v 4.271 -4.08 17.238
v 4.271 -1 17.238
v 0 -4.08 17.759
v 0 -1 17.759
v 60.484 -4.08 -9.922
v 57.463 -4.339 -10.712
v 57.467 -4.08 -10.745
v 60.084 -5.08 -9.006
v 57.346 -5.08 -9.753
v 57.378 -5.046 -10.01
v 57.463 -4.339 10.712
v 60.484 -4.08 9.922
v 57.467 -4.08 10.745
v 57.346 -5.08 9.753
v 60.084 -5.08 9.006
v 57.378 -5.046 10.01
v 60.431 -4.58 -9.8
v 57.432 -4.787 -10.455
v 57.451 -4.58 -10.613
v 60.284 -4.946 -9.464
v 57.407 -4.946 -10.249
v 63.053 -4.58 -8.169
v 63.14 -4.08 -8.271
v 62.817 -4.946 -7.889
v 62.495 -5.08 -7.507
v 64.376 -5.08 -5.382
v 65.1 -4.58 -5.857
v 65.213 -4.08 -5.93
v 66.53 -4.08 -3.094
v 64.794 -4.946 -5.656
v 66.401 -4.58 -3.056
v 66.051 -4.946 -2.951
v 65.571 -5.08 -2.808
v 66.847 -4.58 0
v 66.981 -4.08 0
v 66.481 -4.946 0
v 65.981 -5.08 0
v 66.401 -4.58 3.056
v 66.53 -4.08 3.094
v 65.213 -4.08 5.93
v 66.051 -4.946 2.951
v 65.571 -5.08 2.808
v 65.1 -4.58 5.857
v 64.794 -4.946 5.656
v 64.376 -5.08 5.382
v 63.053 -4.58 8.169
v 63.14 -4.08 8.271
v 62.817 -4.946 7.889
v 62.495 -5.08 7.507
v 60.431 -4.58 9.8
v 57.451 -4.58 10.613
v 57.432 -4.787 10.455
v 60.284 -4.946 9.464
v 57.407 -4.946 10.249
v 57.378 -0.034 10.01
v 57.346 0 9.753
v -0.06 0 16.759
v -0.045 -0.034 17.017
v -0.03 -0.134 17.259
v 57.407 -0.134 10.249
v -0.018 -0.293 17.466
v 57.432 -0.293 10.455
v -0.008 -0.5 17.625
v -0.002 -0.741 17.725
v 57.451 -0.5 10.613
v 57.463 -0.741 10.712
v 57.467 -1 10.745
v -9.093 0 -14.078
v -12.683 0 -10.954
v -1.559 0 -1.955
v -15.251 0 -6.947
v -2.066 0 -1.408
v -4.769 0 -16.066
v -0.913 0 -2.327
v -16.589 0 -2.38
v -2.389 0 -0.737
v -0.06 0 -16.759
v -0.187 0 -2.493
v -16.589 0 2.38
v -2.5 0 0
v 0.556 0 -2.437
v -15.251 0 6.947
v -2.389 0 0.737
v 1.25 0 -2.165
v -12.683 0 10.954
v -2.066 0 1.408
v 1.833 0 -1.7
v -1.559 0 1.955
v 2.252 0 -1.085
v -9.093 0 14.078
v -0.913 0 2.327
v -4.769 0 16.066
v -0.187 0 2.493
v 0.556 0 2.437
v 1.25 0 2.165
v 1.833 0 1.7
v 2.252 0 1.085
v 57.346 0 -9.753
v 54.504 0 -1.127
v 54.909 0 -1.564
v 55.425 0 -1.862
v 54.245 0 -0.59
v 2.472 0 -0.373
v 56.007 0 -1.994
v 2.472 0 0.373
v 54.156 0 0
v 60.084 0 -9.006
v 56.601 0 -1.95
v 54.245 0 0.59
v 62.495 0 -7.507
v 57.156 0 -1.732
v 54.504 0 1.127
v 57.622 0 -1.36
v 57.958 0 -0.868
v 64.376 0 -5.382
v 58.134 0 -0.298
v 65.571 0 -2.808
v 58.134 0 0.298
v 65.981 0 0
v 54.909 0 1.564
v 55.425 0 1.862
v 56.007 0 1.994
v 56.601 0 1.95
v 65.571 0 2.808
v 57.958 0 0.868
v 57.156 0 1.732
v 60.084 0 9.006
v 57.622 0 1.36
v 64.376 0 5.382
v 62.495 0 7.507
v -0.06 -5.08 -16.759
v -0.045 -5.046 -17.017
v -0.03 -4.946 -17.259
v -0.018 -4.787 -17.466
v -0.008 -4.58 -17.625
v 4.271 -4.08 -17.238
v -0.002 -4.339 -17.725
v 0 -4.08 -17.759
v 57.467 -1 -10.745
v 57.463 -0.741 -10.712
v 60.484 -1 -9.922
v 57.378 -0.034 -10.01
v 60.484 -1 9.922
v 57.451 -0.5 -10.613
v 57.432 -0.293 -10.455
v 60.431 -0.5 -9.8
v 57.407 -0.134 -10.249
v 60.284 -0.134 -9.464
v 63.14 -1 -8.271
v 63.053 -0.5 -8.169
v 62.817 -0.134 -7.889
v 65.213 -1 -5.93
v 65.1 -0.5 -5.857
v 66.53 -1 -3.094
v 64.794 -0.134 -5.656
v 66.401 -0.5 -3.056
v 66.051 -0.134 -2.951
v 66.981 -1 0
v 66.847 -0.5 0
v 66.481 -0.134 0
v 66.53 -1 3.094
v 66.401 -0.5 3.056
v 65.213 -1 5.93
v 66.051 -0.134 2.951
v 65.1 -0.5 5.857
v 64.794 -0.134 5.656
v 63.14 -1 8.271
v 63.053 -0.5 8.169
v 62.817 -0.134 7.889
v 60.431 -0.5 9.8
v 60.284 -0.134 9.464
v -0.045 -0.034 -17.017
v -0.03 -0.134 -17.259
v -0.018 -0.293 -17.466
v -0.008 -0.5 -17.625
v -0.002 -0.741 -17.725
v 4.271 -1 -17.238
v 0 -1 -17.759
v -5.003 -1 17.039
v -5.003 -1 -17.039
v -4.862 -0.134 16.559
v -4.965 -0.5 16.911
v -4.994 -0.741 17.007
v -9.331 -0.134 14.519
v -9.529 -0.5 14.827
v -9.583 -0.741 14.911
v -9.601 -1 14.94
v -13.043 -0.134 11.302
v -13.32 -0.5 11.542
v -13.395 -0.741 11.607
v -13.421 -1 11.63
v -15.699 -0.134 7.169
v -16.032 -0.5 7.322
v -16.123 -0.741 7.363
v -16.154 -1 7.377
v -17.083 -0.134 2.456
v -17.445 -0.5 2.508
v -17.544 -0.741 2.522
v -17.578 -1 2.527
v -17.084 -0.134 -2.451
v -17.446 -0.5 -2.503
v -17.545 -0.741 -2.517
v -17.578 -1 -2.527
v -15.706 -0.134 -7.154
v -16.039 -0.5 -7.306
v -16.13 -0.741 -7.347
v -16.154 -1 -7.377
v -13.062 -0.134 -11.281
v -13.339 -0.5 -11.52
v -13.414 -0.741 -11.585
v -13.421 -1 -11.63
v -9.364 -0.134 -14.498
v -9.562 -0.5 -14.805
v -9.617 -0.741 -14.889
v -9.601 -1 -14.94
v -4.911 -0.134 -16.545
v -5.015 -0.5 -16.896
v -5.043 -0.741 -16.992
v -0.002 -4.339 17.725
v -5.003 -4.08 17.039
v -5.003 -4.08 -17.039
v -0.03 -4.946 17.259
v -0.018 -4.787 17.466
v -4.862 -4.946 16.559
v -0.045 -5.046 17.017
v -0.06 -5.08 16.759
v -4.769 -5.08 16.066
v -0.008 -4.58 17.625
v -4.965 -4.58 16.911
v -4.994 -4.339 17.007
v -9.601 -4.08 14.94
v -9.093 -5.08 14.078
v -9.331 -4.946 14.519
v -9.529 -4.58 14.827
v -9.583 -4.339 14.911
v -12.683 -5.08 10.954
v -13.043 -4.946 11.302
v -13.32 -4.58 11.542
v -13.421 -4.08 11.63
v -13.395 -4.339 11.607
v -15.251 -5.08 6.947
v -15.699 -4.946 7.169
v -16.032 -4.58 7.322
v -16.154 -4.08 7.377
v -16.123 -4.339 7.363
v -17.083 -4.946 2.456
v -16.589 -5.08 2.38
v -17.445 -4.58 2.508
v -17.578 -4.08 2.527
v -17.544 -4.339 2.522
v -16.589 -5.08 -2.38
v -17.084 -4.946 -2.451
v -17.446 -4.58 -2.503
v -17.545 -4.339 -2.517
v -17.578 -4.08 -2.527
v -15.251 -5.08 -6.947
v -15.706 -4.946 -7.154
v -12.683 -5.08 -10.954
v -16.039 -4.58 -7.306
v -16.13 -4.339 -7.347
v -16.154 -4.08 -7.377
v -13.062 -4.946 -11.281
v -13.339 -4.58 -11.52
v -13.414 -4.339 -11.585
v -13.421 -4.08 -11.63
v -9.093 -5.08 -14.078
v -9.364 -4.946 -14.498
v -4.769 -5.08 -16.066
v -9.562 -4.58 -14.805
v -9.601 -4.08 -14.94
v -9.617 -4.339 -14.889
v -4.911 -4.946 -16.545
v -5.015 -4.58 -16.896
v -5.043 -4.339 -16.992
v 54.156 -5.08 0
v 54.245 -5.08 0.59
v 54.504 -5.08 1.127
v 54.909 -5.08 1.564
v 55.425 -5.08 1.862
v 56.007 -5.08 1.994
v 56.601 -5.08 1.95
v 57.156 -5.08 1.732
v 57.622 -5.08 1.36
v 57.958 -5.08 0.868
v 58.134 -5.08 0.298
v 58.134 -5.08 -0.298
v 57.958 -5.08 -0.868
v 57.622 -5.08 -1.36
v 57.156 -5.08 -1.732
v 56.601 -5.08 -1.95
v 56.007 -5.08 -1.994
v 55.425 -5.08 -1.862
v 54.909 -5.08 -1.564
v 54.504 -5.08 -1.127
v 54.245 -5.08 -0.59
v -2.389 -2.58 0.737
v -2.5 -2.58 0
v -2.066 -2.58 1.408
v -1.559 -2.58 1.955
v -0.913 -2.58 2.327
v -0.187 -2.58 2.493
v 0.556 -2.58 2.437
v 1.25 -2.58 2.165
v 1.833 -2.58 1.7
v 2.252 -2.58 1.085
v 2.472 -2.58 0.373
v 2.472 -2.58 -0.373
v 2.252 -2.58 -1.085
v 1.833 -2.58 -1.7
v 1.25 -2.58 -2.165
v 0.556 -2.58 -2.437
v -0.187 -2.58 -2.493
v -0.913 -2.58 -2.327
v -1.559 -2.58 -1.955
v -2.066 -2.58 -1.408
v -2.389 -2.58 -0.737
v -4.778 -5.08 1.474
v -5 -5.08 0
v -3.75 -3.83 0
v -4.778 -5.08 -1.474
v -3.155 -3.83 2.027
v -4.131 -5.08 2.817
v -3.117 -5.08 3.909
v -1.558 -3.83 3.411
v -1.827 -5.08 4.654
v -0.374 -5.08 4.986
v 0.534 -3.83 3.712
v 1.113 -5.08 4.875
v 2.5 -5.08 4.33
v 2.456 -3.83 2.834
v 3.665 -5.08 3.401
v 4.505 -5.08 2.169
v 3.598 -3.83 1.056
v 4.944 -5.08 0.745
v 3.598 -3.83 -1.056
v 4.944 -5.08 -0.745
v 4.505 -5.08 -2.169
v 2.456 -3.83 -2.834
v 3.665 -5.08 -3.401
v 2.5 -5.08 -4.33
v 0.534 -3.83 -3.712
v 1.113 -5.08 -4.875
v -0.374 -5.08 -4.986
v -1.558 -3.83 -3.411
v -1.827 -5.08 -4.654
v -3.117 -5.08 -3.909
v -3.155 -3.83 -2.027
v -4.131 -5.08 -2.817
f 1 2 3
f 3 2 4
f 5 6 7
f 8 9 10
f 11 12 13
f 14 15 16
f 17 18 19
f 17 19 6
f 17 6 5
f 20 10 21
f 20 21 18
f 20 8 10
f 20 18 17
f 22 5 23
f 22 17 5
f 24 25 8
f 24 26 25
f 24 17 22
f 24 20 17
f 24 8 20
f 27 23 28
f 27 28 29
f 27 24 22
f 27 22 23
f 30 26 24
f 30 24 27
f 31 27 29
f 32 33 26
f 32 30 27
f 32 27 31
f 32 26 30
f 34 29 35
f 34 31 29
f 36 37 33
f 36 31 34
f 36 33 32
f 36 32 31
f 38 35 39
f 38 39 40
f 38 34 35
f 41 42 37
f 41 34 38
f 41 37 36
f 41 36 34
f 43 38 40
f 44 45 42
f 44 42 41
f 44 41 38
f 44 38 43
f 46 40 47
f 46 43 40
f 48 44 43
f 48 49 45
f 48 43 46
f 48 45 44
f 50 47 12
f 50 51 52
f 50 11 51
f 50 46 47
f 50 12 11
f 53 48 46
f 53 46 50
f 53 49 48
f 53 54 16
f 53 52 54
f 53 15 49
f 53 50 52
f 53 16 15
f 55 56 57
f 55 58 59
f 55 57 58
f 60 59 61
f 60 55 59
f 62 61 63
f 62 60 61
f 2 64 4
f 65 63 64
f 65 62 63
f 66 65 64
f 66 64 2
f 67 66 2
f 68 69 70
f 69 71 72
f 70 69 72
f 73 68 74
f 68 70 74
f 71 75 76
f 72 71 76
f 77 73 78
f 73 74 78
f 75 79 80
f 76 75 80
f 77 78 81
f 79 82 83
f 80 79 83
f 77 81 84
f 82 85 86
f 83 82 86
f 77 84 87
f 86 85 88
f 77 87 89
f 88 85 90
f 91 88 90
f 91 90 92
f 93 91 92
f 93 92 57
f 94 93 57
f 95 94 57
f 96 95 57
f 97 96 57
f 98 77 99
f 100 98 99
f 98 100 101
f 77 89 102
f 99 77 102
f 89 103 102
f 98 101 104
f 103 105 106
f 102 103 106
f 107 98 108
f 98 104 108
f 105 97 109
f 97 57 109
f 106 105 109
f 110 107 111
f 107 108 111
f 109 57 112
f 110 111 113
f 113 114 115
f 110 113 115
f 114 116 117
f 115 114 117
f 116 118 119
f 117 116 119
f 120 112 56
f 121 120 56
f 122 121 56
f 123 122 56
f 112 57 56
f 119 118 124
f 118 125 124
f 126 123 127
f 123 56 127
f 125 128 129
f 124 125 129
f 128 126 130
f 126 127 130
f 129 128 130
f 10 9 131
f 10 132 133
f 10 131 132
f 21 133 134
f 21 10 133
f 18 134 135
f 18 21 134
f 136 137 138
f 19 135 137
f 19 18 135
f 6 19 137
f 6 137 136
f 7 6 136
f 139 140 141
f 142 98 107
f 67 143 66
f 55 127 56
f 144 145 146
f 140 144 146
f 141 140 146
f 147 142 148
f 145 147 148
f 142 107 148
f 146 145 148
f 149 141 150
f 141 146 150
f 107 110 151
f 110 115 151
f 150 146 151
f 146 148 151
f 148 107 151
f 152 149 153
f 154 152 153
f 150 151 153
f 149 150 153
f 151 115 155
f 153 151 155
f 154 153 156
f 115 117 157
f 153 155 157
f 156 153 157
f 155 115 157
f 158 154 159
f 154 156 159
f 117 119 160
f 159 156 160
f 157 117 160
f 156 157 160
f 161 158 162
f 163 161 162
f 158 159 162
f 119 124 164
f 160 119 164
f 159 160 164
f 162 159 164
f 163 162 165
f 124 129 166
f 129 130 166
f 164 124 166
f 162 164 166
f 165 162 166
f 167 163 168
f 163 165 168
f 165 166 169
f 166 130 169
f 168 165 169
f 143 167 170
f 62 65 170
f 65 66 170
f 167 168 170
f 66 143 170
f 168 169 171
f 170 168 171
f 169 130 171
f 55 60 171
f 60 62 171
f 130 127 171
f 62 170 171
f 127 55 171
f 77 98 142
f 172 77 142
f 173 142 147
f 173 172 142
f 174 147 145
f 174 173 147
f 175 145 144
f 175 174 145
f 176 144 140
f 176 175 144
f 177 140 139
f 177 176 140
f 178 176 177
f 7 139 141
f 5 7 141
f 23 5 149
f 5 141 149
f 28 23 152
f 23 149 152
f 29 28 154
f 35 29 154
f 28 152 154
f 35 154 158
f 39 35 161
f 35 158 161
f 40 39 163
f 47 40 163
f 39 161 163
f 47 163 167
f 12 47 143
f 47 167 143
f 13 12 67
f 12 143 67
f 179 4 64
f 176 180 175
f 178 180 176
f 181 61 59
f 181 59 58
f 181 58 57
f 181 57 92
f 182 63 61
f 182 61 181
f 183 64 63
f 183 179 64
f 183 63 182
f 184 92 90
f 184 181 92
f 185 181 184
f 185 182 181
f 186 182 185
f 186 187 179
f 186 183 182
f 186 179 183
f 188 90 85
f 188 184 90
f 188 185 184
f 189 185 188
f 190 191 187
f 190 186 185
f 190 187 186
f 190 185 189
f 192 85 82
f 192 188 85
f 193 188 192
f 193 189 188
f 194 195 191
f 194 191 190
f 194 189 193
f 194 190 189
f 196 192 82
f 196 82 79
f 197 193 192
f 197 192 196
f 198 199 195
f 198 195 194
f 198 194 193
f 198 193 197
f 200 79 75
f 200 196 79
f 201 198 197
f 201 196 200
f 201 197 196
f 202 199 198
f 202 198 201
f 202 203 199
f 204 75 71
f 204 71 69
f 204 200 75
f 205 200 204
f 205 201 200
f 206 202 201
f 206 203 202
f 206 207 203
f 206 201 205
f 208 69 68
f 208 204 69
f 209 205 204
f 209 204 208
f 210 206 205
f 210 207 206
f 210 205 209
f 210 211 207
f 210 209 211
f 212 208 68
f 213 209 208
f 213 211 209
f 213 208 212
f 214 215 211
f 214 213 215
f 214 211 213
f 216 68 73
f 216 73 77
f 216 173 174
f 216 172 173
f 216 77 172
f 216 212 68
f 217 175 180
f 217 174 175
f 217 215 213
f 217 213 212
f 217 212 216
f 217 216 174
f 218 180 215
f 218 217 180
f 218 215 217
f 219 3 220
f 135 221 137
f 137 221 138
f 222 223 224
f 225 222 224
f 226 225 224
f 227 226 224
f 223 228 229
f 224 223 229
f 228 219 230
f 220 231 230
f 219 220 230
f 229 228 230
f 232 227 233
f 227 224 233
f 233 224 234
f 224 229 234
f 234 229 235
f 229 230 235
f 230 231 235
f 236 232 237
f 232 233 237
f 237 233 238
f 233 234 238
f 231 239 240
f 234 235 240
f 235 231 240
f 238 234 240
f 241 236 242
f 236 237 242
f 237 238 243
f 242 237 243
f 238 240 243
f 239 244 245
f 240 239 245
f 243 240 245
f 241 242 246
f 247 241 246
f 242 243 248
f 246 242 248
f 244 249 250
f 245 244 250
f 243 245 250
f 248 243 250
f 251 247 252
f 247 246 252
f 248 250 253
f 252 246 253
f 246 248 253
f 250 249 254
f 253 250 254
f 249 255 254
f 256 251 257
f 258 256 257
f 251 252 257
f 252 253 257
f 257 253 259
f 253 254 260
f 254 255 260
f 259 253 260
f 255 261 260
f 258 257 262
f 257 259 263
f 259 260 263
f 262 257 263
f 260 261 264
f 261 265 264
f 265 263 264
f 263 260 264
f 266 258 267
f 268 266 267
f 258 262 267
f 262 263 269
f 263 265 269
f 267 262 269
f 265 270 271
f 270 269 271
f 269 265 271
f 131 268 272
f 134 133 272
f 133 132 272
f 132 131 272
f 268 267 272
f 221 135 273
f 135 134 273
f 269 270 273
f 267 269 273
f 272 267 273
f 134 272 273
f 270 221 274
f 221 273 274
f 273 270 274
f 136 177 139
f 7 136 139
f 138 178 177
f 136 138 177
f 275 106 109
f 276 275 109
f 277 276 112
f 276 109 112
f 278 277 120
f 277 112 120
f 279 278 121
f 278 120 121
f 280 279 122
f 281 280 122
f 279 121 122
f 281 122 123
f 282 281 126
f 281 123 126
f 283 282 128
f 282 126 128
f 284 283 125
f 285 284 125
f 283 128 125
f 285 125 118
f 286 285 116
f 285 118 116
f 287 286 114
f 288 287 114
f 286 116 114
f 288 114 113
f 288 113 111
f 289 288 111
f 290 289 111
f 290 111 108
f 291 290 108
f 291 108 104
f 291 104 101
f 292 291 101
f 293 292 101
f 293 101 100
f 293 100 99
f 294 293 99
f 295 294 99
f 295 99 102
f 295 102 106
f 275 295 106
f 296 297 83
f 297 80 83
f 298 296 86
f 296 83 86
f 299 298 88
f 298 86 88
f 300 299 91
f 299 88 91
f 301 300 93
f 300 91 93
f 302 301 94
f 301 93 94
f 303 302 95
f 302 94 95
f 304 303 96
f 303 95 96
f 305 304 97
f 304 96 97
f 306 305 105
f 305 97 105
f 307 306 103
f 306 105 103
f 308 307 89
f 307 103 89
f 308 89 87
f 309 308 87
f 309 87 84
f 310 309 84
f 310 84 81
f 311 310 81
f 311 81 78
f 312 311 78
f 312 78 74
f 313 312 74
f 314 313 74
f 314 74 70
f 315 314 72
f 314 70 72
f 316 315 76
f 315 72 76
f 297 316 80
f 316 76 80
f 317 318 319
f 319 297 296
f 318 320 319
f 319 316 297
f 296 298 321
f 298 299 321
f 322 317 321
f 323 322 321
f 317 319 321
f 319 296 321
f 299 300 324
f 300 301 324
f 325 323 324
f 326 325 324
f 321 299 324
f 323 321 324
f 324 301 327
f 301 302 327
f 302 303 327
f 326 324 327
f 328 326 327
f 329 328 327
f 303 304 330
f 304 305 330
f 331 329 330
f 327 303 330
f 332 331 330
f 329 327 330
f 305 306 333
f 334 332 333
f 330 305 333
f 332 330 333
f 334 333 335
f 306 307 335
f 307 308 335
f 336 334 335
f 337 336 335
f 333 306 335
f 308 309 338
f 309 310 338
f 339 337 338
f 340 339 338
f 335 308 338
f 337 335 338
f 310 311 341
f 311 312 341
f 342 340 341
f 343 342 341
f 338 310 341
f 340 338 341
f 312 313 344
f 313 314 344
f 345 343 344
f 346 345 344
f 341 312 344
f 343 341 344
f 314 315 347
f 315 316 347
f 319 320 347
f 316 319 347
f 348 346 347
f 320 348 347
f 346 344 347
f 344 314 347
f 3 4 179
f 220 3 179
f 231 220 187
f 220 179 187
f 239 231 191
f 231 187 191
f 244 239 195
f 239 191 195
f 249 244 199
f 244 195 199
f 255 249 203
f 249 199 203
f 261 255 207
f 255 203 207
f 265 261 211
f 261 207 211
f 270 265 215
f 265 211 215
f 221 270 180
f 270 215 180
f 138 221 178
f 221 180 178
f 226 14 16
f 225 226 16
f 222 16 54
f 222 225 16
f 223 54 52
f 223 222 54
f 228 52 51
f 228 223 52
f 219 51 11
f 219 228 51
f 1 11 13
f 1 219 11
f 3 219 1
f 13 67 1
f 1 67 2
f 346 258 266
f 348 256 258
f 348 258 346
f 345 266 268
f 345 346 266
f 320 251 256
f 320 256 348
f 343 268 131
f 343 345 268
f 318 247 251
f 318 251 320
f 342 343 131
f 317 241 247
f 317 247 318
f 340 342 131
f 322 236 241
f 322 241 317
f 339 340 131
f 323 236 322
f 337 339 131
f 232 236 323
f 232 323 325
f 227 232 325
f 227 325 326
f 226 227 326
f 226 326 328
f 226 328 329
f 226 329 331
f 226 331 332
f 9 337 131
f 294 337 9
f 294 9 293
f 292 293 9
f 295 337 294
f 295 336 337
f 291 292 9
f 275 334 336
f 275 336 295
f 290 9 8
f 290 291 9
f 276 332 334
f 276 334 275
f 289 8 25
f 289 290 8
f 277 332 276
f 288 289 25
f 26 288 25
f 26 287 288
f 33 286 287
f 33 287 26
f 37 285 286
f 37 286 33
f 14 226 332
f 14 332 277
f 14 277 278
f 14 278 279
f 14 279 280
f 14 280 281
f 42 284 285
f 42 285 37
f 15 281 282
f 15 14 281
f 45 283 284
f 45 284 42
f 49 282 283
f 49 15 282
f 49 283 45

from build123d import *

# Parameters (mm, degrees)
F1_DEPTH       = 5.08
F2_T1_DEPTH    = 62.1438386925
F2_T3_DEPTH    = 62.1438386925
F2_T6_ANGLE    = 166.0840890898
F2_T8_ANGLE    = 196.1575929171
F3_T1_DEPTH    = 62.1438386925
F3_T3_DEPTH    = 62.1438386925
F3_T6_ANGLE    = 166.0840890898
F3_T8_ANGLE    = 196.1575929171
F5_D           = 5
F5_CSINK_D     = 10
F5_CSINK_ANGLE = 90
F6_D           = 4


# Not quite as in the source:
# - a fillet or chamfer that OpenCascade refuses, or shapes differently, is made with other operations: its cross-section is extruded or revolved along the edge and cut away or added


with BuildPart() as f1:
    # F0 (on Front) → F1 (new body)
    with BuildSketch(Plane.XZ):
        with BuildLine():
            Line((57.4674687515, 10.7454937358), (4.2709509748, 17.237583418))
            Line((4.2709509748, 17.237583418), (0, 17.7588092034))
            ThreePointArc((0, 17.7588092034), (-17.7588092034, 0), (0, -17.7588092034))
            Line((0, -17.7588092034), (4.2709509748, -17.237583418))
            Line((4.2709509748, -17.237583418), (57.4674687515, -10.7454937358))
            ThreePointArc((57.4674687515, -10.7454937358), (66.9813094594, 0), (57.4674687515, 10.7454937358))
        make_face()
    extrude(amount=F1_DEPTH)

    # F2: fillet of radius 1 on 4 edges, made by hand

    # F2_s2 → F2_t1 (cut)
    with BuildSketch(Plane(origin=(-6.354175572, 0, 0.7754619925), x_dir=(0, 1, 0), z_dir=(0.992635314, 0, -0.1211409647))):
        with BuildLine():
            ThreePointArc((-5.08, 16.6280211506), (-4.7871067812, 17.3351279318), (-4.08, 17.6280211506))
            Line((-4.08, 17.6280211506), (-5.08, 17.6280211506))
            Line((-5.08, 17.6280211506), (-5.08, 16.6280211506))
        make_face()
    extrude(amount=F2_T1_DEPTH, mode=Mode.SUBTRACT)

    # F2_s4 → F2_t3 (cut)
    with BuildSketch(Plane(origin=(55.3319932641, 0, 6.7527025749), x_dir=(0, 1, 0), z_dir=(-0.992635314, 0, -0.1211409647))):
        with BuildLine():
            ThreePointArc((-5.08, 16.6280211506), (-4.7871067812, 17.3351279318), (-4.08, 17.6280211506))
            Line((-4.08, 17.6280211506), (-5.08, 17.6280211506))
            Line((-5.08, 17.6280211506), (-5.08, 16.6280211506))
        make_face()
    extrude(amount=F2_T3_DEPTH, mode=Mode.SUBTRACT)

    # F2_s5 → F2_t6 (revolve, cut)
    with BuildSketch(Plane(origin=(55.3319932641, 0, 6.7527025749), x_dir=(0, 1, 0), z_dir=(-0.992635314, 0, -0.1211409647))):
        with BuildLine():
            ThreePointArc((-4.08, 17.6280211506), (-4.7871067812, 17.3351279318), (-5.08, 16.6280211506))
            Line((-5.08, 16.6280211506), (-5.08, 17.6280211506))
            Line((-5.08, 17.6280211506), (-4.08, 17.6280211506))
        make_face()
    revolve(axis=Axis((56.156091392, -5.08, 0), (0, -1, 0)), revolution_arc=F2_T6_ANGLE, mode=Mode.SUBTRACT)

    # F2_s7 → F2_t8 (revolve, cut)
    with BuildSketch(Plane(origin=(0, 0, 0), x_dir=(0, 1, 0), z_dir=(0.9900757335, 0, -0.1405348426))):
        with BuildLine():
            ThreePointArc((-5.08, 16.7588092034), (-4.7871067812, 17.4659159846), (-4.08, 17.7588092034))
            Line((-4.08, 17.7588092034), (-5.08, 17.7588092034))
            Line((-5.08, 17.7588092034), (-5.08, 16.7588092034))
        make_face()
    revolve(axis=Axis((0, -5.08, 0), (0, -1, 0)), revolution_arc=F2_T8_ANGLE, mode=Mode.SUBTRACT)

    # F3: fillet of radius 1 on 4 edges, made by hand

    # F3_s2 → F3_t1 (cut)
    with BuildSketch(Plane(origin=(55.3319932641, 0, -6.7527025749), x_dir=(0, 1, 0), z_dir=(-0.992635314, 0, 0.1211409647))):
        with BuildLine():
            ThreePointArc((0, -16.6280211506), (-0.2928932188, -17.3351279318), (-1, -17.6280211506))
            Line((-1, -17.6280211506), (0, -17.6280211506))
            Line((0, -17.6280211506), (0, -16.6280211506))
        make_face()
    extrude(amount=F3_T1_DEPTH, mode=Mode.SUBTRACT)

    # F3_s4 → F3_t3 (cut)
    with BuildSketch(Plane(origin=(-6.354175572, 0, -0.7754619925), x_dir=(0, 1, 0), z_dir=(0.992635314, 0, 0.1211409647))):
        with BuildLine():
            ThreePointArc((0, -16.6280211506), (-0.2928932188, -17.3351279318), (-1, -17.6280211506))
            Line((-1, -17.6280211506), (0, -17.6280211506))
            Line((0, -17.6280211506), (0, -16.6280211506))
        make_face()
    extrude(amount=F3_T3_DEPTH, mode=Mode.SUBTRACT)

    # F3_s5 → F3_t6 (revolve, cut)
    with BuildSketch(Plane(origin=(55.3319932641, 0, 6.7527025749), x_dir=(0, 1, 0), z_dir=(-0.992635314, 0, -0.1211409647))):
        with BuildLine():
            ThreePointArc((-1, 17.6280211506), (-0.2928932188, 17.3351279318), (0, 16.6280211506))
            Line((0, 16.6280211506), (0, 17.6280211506))
            Line((0, 17.6280211506), (-1, 17.6280211506))
        make_face()
    revolve(axis=Axis((56.156091392, 0, 0), (0, -1, 0)), revolution_arc=F3_T6_ANGLE, mode=Mode.SUBTRACT)

    # F3_s7 → F3_t8 (revolve, cut)
    with BuildSketch(Plane(origin=(0, 0, 0), x_dir=(0, 1, 0), z_dir=(0.9900757335, 0, -0.1405348426))):
        with BuildLine():
            ThreePointArc((0, 16.7588092034), (-0.2928932188, 17.4659159846), (-1, 17.7588092034))
            Line((-1, 17.7588092034), (0, 17.7588092034))
            Line((0, 17.7588092034), (0, 16.7588092034))
        make_face()
    revolve(axis=Axis((0, 0, 0), (0, -1, 0)), revolution_arc=F3_T8_ANGLE, mode=Mode.SUBTRACT)

    # F5 (through all)
    with Locations(Plane.XZ.offset(5.08)):
        with Locations((0, 0)):
            CounterSinkHole(F5_D / 2, F5_CSINK_D / 2, counter_sink_angle=F5_CSINK_ANGLE)

    # F6 (through all)
    with Locations(Plane.XZ.offset(5.08)):
        with Locations((56.156091392, 0)):
            Hole(F6_D / 2)


solid = f1.part
